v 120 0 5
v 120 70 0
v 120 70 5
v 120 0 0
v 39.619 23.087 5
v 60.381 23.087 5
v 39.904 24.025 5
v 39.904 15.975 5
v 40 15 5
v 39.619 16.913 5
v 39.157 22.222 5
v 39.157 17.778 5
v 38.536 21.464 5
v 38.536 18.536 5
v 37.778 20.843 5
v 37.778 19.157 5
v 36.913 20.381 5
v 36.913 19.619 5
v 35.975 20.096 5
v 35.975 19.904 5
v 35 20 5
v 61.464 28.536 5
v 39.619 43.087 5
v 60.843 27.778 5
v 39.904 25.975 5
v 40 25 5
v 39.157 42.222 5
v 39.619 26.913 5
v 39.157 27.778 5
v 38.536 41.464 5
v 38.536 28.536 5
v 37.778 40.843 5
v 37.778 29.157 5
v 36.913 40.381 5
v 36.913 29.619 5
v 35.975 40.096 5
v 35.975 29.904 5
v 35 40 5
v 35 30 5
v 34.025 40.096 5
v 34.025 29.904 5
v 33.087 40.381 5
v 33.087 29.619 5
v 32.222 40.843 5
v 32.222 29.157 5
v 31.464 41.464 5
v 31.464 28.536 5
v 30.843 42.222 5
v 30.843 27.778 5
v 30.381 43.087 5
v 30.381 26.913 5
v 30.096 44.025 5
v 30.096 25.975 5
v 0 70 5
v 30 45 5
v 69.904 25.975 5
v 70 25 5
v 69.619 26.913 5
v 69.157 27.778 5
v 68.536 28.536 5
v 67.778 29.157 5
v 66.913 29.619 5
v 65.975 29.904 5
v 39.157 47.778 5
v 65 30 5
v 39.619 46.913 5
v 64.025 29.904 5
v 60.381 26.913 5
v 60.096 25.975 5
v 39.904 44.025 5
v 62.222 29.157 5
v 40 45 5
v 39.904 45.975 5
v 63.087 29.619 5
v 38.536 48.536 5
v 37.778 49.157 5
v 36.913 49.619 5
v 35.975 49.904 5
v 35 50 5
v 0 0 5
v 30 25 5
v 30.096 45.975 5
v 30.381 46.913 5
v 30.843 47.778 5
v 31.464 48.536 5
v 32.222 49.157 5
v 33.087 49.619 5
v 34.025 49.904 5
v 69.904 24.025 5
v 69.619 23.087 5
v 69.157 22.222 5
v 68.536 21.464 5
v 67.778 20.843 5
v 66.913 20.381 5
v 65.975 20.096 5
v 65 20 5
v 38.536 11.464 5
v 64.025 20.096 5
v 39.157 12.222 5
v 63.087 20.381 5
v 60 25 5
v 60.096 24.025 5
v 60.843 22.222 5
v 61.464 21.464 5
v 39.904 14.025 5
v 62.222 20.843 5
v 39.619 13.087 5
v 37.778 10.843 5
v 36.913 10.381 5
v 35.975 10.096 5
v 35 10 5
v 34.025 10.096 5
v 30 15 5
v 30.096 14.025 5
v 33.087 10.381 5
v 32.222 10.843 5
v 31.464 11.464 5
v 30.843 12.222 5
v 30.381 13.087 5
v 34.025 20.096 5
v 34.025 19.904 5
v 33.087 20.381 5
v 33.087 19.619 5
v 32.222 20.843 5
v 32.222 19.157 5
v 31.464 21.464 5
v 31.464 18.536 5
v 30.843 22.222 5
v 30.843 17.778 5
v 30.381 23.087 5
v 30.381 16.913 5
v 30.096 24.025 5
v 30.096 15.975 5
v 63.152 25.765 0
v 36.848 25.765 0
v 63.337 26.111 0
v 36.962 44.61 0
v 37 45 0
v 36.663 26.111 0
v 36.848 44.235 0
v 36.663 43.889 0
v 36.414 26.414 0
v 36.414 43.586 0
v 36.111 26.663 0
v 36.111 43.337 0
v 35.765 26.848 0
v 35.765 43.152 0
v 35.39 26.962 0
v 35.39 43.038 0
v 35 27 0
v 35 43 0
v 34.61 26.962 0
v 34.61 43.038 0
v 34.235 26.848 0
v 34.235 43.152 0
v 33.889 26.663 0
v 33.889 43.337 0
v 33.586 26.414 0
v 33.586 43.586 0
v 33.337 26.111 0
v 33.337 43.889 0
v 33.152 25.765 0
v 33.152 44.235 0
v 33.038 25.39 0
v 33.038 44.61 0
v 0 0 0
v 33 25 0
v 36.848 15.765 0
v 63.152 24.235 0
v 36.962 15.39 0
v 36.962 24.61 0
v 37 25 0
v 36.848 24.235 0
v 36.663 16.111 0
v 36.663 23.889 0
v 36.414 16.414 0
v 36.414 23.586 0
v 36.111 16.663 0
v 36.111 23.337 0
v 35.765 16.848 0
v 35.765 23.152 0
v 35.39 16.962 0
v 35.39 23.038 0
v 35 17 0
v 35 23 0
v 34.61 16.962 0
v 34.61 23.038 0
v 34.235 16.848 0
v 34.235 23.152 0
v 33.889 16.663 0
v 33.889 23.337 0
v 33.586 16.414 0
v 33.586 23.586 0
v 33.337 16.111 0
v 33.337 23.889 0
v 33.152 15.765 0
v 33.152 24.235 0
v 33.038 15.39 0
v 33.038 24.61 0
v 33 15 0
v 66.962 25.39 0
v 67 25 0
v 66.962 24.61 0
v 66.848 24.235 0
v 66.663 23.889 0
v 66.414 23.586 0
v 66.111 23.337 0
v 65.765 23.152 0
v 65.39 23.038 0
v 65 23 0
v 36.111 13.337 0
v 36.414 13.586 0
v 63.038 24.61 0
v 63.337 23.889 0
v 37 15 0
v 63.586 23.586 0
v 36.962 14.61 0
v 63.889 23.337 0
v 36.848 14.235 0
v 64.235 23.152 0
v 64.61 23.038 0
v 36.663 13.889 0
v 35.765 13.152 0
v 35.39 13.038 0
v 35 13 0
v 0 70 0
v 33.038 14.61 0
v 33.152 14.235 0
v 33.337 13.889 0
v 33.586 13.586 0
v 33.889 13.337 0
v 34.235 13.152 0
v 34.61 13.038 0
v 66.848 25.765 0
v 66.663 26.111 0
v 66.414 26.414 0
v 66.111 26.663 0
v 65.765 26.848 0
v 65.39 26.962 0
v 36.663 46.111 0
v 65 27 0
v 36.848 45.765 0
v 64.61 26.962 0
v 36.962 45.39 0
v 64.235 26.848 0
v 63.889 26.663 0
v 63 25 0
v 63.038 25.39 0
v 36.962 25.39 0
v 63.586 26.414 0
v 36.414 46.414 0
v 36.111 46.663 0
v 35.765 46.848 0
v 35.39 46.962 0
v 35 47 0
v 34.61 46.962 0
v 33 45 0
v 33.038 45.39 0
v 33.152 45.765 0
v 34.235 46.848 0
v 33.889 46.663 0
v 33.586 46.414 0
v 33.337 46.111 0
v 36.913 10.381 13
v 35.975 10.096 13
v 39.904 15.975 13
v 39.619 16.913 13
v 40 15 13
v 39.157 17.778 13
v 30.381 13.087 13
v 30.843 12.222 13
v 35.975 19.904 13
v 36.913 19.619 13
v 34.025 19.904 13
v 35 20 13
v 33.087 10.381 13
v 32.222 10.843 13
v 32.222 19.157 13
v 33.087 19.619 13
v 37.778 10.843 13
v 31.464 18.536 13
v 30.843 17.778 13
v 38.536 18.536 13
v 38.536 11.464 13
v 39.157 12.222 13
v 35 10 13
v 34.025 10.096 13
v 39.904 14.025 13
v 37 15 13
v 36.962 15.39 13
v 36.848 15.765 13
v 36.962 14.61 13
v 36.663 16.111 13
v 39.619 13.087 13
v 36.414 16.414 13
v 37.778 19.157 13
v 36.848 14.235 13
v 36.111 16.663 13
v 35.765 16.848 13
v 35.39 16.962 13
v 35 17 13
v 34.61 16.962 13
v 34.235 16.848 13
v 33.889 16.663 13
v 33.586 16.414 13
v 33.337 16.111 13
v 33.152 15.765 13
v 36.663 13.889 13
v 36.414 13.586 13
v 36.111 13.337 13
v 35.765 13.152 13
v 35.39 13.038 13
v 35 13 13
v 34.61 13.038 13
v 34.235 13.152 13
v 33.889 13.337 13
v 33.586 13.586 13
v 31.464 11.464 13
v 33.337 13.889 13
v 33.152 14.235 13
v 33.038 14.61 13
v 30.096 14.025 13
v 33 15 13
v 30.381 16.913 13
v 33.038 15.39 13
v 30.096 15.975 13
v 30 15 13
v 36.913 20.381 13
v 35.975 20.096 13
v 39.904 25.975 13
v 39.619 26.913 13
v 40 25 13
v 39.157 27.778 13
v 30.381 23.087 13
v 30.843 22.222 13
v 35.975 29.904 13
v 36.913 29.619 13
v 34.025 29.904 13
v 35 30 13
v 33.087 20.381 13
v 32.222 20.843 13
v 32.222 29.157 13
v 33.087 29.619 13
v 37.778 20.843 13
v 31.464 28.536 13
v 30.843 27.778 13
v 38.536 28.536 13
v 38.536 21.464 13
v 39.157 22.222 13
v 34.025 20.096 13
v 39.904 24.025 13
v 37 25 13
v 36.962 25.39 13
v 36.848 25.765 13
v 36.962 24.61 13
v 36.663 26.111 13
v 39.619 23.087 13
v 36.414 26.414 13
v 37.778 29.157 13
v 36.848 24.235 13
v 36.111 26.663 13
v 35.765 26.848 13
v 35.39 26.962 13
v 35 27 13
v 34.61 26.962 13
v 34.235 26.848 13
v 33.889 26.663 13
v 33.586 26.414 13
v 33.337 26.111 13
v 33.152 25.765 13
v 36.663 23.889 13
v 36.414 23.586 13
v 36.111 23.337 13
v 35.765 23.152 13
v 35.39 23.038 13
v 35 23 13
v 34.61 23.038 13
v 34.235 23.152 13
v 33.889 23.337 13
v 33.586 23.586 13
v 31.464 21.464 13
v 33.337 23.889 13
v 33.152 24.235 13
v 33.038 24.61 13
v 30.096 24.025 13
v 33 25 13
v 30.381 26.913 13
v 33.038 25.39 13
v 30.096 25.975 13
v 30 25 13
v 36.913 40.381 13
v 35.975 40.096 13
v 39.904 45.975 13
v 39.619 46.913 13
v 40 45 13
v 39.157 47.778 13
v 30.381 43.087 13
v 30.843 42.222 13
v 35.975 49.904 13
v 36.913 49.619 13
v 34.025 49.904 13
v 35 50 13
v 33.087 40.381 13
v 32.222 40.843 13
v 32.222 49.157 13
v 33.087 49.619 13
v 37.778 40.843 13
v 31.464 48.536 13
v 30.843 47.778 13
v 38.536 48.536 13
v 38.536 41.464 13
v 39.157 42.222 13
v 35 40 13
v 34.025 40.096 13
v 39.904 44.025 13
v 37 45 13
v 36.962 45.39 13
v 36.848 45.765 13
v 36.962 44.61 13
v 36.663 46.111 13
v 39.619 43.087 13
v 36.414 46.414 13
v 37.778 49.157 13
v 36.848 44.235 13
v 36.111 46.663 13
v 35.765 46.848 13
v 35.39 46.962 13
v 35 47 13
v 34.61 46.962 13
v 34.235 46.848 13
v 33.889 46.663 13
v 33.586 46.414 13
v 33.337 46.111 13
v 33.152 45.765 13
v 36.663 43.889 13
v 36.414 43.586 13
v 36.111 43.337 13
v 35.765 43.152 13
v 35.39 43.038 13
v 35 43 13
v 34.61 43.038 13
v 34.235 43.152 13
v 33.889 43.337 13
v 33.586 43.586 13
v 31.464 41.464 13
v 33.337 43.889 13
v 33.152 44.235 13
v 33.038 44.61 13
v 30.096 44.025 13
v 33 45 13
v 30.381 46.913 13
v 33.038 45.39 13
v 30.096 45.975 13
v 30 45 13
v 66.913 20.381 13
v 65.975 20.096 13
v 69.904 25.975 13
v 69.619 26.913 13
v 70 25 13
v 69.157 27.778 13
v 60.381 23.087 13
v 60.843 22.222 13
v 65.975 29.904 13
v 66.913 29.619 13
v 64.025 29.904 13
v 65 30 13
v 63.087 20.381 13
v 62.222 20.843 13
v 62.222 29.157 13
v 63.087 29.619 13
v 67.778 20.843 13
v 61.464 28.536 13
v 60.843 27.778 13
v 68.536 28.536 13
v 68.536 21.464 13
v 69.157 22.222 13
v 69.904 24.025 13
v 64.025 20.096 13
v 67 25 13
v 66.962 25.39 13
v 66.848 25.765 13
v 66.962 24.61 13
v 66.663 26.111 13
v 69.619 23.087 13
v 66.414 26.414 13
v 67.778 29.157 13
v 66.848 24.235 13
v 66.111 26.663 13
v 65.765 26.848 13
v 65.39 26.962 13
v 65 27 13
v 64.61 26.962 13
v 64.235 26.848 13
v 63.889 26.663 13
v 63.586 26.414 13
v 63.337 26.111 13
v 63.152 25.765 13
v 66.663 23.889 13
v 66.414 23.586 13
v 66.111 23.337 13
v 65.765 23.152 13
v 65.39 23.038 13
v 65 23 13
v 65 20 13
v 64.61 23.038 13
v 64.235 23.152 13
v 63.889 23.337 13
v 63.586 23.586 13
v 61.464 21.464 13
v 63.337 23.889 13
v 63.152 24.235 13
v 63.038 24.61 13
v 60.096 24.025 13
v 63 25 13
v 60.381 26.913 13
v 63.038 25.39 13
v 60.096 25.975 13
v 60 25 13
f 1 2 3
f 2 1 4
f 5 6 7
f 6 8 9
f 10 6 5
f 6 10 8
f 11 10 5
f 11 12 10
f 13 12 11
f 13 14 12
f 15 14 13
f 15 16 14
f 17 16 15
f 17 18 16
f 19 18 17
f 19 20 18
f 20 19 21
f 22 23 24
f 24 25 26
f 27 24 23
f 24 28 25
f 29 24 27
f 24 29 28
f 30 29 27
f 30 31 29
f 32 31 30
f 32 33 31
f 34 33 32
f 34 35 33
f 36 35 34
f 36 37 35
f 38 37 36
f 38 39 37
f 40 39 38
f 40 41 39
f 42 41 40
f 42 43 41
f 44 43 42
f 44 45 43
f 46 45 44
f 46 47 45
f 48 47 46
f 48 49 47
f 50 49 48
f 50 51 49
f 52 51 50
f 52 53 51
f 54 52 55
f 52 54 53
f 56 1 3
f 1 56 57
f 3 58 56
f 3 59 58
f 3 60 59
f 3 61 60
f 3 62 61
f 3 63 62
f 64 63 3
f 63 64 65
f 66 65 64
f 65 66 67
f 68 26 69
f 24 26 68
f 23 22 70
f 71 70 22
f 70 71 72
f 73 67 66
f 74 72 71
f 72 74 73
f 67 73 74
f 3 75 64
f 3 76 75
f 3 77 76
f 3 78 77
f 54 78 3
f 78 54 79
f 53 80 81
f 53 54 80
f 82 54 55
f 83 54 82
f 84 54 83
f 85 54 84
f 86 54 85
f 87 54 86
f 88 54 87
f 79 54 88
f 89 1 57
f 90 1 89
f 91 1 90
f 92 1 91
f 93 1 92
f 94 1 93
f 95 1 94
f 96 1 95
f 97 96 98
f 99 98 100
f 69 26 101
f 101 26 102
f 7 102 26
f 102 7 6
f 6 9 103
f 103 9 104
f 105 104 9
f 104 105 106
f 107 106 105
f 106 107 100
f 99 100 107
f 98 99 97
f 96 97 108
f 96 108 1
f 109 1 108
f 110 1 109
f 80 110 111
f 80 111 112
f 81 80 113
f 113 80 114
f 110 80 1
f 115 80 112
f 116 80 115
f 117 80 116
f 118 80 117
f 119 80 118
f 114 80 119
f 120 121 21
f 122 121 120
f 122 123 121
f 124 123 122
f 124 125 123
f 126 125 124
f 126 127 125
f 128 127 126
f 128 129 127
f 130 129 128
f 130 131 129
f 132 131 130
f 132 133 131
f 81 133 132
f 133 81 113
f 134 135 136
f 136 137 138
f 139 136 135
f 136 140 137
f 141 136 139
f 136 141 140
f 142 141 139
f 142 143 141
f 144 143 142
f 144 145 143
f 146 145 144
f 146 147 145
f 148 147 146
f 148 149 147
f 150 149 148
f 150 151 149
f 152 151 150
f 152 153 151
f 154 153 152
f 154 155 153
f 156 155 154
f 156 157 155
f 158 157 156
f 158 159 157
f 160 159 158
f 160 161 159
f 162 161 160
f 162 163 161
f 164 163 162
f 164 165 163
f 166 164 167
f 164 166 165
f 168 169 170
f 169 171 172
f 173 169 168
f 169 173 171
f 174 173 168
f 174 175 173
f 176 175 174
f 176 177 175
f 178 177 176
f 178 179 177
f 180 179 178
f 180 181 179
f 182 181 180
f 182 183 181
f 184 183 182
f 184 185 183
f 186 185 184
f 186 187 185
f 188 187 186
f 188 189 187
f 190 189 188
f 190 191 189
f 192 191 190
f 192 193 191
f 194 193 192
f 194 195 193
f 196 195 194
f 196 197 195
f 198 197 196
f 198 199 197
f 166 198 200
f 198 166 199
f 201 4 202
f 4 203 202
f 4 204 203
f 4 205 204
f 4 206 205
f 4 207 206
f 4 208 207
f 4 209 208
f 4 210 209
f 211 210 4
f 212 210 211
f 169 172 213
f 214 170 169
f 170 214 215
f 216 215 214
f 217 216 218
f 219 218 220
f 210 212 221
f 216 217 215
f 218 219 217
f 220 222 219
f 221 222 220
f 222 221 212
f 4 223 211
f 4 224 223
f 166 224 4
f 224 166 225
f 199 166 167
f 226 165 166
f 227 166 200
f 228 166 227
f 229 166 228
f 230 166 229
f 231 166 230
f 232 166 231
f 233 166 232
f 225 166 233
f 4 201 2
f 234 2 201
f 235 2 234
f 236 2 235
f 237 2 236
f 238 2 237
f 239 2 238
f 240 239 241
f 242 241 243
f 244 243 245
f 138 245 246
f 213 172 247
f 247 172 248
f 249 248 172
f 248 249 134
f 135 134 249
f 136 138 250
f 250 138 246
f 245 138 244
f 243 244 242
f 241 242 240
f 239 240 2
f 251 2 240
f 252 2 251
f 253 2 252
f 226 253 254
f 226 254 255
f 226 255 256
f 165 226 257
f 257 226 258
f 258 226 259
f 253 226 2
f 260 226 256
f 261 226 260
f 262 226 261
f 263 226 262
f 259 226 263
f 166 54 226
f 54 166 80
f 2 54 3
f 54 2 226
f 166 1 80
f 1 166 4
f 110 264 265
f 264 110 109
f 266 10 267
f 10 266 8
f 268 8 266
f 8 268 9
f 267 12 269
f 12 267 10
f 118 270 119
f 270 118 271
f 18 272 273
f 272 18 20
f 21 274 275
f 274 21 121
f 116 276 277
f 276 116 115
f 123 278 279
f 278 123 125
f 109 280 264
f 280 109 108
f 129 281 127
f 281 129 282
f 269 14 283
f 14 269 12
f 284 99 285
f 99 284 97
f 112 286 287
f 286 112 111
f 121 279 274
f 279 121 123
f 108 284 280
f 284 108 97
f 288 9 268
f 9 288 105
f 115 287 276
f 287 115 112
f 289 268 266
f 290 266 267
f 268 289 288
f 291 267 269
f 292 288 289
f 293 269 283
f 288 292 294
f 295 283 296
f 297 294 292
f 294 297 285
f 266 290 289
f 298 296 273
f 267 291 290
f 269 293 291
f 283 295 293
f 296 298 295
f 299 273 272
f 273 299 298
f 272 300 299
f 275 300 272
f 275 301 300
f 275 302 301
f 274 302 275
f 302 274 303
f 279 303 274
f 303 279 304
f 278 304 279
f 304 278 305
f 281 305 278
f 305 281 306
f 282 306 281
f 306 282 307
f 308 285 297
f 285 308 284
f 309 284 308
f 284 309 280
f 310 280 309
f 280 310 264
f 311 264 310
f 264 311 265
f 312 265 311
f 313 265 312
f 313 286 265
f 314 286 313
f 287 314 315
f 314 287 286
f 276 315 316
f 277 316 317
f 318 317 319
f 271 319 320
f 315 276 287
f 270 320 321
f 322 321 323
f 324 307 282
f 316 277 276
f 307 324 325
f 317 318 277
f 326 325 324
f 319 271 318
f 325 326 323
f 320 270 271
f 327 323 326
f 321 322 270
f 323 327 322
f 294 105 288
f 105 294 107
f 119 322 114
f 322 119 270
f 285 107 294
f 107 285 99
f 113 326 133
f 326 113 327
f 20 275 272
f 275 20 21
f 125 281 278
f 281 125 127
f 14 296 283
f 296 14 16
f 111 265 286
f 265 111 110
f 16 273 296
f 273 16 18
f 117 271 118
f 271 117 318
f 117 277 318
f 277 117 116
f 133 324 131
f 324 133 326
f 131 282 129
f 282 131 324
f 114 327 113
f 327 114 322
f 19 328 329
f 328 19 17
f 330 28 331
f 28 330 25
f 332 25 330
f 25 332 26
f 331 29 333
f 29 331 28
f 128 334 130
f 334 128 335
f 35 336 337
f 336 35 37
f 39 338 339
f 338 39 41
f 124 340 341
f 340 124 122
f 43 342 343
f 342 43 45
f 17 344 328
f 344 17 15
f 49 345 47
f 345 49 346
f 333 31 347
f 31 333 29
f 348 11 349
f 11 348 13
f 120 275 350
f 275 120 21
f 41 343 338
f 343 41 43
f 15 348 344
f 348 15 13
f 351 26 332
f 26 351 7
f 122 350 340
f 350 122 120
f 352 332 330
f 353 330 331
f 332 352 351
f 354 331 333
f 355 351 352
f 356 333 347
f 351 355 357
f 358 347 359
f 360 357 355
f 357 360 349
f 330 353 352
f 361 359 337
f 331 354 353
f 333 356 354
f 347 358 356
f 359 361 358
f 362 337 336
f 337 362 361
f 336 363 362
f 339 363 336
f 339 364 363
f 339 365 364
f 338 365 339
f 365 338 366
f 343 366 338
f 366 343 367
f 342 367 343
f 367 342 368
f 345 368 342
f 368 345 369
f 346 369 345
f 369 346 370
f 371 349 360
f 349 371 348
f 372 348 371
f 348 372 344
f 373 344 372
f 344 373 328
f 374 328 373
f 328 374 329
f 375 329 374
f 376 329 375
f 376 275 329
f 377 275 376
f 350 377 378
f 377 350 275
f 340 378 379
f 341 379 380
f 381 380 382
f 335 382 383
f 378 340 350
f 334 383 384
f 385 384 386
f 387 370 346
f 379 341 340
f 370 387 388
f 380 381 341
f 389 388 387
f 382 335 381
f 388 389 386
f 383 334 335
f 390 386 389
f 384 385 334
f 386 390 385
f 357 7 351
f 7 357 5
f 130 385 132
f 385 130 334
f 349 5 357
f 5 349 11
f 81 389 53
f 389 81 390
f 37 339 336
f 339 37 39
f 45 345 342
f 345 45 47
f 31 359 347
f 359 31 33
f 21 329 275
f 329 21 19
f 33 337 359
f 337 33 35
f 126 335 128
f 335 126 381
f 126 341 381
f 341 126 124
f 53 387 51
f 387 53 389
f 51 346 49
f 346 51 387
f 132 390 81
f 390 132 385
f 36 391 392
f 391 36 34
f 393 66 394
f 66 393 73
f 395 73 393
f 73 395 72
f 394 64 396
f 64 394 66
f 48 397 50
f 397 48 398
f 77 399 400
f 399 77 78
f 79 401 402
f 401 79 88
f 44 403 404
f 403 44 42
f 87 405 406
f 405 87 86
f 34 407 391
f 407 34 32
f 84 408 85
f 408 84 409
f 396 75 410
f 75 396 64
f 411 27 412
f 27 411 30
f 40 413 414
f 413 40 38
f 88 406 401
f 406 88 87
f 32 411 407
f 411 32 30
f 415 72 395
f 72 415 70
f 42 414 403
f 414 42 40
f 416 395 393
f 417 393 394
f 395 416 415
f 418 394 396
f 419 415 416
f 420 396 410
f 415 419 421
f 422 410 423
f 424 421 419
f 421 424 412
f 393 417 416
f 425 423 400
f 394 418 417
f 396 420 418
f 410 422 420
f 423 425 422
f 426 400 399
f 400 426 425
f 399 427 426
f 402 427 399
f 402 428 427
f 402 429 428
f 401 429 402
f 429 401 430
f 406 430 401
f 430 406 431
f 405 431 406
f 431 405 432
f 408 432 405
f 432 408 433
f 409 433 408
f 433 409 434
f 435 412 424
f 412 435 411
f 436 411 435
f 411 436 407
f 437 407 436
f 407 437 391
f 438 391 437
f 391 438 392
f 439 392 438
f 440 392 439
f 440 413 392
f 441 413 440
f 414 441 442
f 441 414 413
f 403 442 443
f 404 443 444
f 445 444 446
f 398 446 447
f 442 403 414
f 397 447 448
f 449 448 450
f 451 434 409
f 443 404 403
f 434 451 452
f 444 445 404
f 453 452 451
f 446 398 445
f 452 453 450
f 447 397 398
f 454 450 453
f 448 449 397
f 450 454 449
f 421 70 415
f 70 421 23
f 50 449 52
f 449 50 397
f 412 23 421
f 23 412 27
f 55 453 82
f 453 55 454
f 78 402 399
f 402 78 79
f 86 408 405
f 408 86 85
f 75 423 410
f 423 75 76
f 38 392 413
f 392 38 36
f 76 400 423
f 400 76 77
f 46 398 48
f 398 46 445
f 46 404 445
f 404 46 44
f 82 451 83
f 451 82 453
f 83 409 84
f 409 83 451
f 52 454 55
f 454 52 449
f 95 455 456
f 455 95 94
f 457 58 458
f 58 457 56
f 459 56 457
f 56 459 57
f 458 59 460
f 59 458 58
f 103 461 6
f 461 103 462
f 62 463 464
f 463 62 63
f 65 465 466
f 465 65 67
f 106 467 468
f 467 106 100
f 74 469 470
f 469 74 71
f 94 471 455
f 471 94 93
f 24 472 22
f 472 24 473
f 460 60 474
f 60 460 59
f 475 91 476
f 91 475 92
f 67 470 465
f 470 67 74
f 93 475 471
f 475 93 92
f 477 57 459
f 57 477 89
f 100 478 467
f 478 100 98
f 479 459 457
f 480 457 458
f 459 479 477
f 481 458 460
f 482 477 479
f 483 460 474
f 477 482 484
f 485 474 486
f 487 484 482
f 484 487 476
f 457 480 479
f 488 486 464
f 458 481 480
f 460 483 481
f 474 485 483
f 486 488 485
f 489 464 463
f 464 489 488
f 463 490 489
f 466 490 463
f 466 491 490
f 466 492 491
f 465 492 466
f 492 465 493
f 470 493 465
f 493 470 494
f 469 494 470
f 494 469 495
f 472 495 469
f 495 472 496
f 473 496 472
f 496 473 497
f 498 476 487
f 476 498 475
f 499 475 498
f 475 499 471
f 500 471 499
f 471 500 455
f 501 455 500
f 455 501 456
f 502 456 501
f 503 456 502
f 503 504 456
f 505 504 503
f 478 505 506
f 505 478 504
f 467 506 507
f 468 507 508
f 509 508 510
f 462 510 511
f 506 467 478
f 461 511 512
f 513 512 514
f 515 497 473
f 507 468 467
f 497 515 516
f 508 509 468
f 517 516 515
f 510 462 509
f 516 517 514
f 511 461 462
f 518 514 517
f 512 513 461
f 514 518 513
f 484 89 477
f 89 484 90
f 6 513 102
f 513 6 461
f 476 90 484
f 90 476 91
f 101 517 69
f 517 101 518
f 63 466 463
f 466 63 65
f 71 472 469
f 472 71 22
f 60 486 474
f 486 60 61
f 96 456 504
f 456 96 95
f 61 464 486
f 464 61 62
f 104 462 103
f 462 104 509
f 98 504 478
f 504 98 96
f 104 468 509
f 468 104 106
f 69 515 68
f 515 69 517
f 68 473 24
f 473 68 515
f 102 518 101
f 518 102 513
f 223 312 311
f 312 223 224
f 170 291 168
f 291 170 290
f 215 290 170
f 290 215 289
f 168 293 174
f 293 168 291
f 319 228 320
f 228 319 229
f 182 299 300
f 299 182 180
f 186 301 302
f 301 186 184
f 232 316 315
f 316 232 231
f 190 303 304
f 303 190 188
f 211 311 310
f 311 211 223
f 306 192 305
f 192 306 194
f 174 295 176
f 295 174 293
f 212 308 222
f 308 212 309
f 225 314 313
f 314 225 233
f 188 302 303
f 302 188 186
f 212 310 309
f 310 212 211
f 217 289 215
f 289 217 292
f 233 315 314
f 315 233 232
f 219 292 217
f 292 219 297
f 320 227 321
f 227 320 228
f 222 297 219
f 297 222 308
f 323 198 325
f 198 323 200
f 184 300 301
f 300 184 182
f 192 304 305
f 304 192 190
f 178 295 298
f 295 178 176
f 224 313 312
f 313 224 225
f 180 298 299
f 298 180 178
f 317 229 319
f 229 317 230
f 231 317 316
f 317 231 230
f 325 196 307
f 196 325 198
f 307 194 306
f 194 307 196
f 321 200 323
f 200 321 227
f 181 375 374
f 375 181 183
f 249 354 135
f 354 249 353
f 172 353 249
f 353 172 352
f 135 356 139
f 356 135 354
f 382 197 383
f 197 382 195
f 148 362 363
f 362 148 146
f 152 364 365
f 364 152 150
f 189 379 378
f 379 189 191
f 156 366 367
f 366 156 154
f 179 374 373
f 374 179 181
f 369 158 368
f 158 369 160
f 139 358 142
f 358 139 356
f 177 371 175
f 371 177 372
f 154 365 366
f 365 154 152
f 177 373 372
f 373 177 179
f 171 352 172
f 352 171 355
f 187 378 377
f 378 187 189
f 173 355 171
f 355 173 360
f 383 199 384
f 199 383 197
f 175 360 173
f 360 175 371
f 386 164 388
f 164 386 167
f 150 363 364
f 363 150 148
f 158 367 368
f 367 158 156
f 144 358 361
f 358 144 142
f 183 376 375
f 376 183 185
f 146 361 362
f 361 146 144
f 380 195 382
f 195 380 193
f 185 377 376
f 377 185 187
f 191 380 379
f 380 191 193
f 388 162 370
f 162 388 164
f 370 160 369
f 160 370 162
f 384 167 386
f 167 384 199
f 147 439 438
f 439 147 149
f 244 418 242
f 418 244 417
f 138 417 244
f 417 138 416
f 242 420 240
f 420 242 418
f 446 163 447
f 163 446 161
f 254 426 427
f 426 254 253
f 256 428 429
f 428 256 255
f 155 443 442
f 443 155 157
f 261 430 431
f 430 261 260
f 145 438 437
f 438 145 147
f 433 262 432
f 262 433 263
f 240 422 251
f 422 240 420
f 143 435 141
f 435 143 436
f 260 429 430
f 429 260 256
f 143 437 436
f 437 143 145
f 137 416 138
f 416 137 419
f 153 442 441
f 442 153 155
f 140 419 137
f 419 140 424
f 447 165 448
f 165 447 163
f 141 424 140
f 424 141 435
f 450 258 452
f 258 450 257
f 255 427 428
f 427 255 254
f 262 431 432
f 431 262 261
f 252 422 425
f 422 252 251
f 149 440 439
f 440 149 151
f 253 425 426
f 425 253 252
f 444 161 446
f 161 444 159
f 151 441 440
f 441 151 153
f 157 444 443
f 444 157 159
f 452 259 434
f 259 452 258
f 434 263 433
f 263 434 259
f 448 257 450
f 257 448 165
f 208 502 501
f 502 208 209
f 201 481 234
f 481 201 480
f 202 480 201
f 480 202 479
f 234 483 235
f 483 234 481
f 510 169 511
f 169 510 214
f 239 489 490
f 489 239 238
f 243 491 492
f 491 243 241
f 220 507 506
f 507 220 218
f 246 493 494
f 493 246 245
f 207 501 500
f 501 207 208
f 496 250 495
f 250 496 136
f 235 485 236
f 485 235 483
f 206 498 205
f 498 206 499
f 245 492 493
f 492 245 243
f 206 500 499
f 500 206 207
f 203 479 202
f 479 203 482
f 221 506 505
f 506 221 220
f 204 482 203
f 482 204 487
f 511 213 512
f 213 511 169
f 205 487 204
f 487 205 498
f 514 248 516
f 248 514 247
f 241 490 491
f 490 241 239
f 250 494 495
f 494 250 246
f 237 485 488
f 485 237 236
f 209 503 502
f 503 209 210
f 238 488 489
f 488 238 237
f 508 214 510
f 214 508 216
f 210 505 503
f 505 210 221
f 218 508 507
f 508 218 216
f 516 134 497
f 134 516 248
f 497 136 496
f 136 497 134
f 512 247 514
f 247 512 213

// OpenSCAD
$fn = 32;

// ----------------------------------------------------------------------
// Boss field: plate with bosses at given coordinates
// ----------------------------------------------------------------------

// --- parameters (mm) ---
plate_l = 120;            // plate length, X
plate_w = 70;             // plate width, Y
plate_t = 5;              // plate thickness, Z
boss_d = 10;              // boss diameter
boss_h = 8;               // boss height above the plate
bore_d = 4;               // boss bore

total_h = plate_t + boss_h;  // overall height

difference() {
  union() {
    cube([plate_l, plate_w, plate_t]);
    translate([35, 15, plate_t]) cylinder(h = boss_h, d = boss_d);
    translate([35, 25, plate_t]) cylinder(h = boss_h, d = boss_d);
    translate([35, 45, plate_t]) cylinder(h = boss_h, d = boss_d);
    translate([65, 25, plate_t]) cylinder(h = boss_h, d = boss_d);
  }
  translate([35, 15, -1]) cylinder(h = total_h + 2, d = bore_d);
  translate([35, 25, -1]) cylinder(h = total_h + 2, d = bore_d);
  translate([35, 45, -1]) cylinder(h = total_h + 2, d = bore_d);
  translate([65, 25, -1]) cylinder(h = total_h + 2, d = bore_d);
}
